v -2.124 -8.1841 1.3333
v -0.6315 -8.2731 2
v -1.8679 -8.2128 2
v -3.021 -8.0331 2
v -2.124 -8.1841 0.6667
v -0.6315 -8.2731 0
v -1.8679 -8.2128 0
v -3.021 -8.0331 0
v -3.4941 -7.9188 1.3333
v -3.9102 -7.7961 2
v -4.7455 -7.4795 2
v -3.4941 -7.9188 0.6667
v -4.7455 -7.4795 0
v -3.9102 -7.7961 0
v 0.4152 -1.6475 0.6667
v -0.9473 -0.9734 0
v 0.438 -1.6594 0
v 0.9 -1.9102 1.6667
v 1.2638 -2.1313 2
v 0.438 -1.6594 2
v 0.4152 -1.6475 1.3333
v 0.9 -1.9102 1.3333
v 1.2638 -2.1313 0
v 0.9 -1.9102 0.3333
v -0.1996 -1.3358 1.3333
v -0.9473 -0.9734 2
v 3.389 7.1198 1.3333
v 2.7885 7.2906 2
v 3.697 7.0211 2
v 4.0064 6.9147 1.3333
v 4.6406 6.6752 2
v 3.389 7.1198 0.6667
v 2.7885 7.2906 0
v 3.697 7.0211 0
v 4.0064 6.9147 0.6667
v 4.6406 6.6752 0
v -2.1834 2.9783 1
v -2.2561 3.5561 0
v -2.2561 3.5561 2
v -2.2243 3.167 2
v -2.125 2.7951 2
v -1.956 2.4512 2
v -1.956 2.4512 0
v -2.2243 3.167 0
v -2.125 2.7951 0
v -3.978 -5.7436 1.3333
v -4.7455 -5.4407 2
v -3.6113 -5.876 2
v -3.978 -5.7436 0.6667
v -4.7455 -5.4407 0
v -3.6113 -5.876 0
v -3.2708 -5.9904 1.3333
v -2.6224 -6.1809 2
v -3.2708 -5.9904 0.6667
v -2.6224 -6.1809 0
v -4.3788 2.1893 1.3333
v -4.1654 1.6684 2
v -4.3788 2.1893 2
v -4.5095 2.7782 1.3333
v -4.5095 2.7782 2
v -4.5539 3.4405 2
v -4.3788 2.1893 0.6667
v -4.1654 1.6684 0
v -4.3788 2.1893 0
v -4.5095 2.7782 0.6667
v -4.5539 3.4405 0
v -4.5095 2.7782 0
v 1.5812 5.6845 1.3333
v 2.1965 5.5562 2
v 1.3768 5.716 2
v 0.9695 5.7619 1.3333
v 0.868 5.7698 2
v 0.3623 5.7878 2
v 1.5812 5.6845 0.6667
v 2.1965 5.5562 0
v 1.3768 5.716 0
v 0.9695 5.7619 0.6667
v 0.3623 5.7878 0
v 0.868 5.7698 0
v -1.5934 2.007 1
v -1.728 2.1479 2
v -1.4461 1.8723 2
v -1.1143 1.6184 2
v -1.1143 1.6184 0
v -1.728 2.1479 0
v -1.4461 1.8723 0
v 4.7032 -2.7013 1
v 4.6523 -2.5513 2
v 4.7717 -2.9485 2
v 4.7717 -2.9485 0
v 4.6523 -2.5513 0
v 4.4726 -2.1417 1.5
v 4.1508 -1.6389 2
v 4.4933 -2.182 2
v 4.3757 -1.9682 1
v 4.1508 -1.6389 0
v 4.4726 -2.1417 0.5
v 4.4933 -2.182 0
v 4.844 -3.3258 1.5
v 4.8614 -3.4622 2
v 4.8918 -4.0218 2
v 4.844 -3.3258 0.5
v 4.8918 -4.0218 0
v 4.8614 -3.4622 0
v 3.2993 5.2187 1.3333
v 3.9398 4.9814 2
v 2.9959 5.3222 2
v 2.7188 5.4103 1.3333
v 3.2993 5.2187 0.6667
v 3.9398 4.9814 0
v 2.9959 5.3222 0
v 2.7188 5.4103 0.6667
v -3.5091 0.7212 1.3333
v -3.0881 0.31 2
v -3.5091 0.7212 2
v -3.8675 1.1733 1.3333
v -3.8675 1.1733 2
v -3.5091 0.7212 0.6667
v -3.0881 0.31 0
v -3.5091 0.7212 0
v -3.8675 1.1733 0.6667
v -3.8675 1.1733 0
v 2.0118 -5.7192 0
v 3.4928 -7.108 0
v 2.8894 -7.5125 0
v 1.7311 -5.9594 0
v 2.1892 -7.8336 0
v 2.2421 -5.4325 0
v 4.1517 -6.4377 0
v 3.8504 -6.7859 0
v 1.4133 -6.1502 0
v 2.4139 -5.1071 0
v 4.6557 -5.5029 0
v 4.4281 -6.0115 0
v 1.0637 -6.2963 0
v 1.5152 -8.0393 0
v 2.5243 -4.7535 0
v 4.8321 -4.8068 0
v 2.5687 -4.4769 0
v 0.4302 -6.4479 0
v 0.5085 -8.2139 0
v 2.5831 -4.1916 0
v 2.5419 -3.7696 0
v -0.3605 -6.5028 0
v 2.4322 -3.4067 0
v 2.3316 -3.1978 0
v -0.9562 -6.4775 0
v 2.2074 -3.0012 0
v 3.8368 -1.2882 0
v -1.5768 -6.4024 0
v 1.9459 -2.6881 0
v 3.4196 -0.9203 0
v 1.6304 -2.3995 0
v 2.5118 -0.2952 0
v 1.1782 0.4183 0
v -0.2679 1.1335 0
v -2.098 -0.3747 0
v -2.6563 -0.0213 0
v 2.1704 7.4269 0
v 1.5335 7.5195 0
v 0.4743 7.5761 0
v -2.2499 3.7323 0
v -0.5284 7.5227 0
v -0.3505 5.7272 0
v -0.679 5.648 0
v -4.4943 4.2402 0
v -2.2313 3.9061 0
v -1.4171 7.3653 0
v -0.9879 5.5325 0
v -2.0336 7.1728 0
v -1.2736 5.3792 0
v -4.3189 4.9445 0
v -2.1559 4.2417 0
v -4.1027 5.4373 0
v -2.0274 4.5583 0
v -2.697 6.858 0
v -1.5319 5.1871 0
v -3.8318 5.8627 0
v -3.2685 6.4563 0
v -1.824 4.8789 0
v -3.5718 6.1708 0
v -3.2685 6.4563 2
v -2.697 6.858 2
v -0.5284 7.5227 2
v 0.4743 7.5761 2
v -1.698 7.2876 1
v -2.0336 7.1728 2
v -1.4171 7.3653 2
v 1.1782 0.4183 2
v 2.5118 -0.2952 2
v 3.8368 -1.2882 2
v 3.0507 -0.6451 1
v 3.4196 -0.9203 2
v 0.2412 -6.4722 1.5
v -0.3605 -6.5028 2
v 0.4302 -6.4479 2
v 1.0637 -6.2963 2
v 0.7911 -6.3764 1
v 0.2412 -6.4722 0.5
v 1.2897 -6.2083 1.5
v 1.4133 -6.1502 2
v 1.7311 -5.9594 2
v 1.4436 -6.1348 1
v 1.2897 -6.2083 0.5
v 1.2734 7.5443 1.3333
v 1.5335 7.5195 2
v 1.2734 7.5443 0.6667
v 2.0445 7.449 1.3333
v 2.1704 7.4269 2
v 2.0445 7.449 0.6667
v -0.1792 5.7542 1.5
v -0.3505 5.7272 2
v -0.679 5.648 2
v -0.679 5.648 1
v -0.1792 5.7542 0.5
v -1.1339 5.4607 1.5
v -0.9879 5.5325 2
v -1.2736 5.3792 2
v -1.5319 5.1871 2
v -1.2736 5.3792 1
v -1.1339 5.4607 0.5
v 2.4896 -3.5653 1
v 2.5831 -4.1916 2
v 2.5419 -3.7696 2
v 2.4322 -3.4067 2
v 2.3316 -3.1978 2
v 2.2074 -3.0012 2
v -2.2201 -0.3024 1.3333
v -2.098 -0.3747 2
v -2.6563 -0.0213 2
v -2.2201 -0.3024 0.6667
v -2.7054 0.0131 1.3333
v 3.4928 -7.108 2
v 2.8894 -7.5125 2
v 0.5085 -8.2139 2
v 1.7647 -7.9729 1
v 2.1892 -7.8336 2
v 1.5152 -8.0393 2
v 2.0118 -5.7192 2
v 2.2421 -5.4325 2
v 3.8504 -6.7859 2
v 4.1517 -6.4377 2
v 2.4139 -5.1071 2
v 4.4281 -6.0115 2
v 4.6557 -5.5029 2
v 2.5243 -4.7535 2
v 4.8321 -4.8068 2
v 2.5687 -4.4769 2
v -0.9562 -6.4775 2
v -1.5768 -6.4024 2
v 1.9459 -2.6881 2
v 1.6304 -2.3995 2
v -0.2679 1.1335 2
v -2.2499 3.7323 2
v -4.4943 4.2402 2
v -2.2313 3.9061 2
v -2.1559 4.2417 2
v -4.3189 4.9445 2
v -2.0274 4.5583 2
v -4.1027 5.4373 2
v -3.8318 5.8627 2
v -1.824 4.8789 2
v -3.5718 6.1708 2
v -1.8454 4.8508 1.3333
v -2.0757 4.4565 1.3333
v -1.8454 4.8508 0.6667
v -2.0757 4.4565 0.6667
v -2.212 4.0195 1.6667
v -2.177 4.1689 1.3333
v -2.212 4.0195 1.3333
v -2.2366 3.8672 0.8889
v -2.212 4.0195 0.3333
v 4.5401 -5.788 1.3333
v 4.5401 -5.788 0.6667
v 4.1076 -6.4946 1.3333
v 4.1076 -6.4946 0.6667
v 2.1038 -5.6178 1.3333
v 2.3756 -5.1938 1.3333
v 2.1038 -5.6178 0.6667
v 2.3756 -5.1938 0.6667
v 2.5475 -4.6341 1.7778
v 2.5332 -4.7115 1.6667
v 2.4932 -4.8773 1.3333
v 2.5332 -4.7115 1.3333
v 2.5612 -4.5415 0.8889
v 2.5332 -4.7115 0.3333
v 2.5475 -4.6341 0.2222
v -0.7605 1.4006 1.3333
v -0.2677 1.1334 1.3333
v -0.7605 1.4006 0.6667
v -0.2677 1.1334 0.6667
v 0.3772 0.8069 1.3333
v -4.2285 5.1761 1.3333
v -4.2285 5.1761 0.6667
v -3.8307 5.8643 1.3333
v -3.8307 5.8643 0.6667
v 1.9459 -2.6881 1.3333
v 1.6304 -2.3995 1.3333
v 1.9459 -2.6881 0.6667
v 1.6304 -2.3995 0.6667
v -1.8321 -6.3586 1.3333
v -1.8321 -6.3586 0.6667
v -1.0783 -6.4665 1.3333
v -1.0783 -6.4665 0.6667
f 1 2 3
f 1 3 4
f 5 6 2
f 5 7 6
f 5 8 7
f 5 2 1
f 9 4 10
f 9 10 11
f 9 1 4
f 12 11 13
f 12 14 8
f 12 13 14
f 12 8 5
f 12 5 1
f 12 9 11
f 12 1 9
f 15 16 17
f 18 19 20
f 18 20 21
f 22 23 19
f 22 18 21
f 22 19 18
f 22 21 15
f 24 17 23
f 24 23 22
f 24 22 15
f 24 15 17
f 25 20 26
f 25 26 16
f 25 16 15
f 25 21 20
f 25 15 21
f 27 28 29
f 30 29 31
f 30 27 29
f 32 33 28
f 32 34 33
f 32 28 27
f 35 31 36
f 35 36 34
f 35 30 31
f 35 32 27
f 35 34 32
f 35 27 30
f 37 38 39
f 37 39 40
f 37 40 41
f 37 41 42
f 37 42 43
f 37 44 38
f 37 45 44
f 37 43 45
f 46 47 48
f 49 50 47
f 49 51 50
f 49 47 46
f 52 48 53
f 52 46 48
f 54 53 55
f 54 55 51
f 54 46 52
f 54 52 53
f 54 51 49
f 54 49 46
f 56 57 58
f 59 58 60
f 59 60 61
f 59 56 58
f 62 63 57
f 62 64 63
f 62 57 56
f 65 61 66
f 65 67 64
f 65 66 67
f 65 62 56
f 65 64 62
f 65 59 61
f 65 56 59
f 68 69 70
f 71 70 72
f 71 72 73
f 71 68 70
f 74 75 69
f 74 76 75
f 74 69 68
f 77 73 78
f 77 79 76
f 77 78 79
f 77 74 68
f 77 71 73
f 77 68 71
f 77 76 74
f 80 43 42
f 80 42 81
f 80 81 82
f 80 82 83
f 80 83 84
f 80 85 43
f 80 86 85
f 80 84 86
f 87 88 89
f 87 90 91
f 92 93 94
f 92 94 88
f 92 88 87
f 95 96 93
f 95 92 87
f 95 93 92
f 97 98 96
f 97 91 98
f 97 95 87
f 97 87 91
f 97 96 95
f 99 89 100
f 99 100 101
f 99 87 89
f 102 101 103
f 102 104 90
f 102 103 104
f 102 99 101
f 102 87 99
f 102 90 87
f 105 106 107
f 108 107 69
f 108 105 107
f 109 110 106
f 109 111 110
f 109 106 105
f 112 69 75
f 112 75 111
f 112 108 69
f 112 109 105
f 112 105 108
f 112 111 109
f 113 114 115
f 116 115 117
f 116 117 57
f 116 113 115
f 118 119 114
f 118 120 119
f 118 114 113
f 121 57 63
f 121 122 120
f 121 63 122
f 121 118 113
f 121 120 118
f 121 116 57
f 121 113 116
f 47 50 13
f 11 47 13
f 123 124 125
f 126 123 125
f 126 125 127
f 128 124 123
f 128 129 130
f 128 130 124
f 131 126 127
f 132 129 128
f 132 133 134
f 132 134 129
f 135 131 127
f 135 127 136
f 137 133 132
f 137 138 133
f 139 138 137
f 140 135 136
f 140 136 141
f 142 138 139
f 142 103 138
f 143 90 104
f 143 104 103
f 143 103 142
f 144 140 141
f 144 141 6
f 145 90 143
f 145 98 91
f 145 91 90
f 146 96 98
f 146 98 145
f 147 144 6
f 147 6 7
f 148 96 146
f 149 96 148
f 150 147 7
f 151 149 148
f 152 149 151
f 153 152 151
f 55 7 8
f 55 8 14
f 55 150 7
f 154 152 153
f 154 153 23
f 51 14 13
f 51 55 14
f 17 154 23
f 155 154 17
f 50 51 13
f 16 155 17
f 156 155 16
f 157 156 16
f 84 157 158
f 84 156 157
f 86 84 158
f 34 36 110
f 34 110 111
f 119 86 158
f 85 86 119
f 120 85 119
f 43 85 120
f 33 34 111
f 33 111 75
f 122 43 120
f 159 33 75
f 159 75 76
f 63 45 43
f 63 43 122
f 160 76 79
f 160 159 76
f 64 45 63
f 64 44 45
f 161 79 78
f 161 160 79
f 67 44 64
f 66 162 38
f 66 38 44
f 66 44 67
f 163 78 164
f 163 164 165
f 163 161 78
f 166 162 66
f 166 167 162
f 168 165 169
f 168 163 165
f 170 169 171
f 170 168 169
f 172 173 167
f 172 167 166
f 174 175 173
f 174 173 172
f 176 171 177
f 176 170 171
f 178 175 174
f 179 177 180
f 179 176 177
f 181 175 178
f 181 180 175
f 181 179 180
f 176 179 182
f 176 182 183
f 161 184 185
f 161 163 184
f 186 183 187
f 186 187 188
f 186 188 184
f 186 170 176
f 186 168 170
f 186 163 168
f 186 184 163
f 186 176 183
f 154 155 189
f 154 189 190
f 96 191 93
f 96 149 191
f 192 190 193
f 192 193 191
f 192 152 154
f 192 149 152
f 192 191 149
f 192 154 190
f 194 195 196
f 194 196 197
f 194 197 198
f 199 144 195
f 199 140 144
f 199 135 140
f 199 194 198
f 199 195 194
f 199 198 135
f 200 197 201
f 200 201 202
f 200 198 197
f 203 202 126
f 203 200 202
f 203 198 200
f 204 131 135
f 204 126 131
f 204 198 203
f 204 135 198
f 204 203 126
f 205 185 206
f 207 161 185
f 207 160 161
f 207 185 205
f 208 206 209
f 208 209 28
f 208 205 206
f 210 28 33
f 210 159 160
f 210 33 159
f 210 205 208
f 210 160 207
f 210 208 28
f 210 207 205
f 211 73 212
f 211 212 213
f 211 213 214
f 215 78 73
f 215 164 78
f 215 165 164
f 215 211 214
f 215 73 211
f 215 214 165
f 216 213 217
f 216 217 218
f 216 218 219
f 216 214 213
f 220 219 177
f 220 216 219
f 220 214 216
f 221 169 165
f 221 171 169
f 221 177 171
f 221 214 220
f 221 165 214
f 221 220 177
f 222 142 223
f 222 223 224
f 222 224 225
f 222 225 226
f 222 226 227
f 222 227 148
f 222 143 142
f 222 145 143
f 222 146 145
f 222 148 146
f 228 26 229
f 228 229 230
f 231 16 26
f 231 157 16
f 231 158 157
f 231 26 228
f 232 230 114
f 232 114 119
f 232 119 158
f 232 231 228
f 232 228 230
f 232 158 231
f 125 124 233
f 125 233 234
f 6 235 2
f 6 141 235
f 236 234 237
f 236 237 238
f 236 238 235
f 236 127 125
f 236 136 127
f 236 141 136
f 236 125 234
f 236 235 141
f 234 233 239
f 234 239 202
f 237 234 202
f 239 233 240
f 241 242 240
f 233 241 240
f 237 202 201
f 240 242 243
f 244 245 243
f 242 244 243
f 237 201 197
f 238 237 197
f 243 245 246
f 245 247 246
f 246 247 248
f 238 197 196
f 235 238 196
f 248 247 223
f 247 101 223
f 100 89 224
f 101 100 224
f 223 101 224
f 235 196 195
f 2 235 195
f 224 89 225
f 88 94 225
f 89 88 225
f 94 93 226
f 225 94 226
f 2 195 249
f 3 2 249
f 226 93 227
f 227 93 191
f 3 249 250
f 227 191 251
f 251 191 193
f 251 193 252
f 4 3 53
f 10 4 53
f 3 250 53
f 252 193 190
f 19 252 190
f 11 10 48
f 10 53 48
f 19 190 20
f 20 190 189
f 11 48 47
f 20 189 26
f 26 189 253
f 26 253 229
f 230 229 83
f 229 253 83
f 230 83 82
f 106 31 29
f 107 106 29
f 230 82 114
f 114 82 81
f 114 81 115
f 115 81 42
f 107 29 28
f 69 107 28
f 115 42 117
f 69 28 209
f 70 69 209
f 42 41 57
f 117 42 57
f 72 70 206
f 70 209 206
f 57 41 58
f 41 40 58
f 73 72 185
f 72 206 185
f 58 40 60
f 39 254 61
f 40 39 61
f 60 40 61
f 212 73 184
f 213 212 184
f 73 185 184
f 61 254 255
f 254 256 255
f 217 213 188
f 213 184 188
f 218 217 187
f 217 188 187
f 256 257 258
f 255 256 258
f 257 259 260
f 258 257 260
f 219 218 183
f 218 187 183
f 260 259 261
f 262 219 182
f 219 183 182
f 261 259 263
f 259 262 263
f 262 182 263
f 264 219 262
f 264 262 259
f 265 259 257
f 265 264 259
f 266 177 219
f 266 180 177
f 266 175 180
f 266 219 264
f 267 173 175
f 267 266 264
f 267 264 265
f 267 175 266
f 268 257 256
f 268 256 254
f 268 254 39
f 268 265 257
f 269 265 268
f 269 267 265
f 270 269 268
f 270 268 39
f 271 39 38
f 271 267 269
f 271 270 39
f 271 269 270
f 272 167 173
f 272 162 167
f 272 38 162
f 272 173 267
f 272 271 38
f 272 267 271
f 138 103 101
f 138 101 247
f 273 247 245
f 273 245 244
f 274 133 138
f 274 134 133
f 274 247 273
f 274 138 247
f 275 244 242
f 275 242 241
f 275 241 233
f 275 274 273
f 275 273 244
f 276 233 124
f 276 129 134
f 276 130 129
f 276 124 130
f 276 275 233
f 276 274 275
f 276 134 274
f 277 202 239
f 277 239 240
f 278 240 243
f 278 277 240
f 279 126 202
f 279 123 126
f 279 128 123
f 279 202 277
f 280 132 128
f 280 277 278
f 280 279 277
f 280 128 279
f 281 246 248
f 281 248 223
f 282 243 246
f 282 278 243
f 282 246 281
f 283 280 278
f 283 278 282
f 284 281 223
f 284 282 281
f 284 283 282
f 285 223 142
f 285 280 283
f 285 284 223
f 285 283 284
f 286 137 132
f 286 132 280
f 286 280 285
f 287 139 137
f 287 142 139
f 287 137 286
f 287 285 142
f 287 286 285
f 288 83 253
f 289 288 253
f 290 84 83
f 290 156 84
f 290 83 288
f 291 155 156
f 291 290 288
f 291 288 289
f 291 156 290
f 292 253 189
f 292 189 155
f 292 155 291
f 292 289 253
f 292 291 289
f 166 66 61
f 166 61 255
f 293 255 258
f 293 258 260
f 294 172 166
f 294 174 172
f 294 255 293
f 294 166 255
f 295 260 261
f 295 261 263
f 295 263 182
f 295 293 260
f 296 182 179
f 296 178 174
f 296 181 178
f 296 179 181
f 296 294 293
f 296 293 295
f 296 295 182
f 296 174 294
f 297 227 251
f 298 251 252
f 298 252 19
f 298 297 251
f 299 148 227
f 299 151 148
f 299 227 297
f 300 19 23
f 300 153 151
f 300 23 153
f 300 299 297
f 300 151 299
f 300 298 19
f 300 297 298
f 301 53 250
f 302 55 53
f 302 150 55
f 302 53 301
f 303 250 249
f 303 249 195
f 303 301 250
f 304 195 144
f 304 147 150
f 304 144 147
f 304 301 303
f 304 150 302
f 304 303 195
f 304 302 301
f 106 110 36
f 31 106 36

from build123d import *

# Parameters (mm, degrees)
F1_DEPTH = 2


# Not quite as in the source:
# - ends of sketch curves that miss each other by under 0.0002 mm in the source are joined
# - the dataset's text gives a spline's control points without its knots; the knots are read off the source's solid


with BuildPart() as f1:
    # F0 (on Top) → F1 (new body)
    with BuildSketch(Plane.XY):
        with BuildLine():
            add(Edge.make_bspline(
                [(-4.5539323159, 3.4404925622), (-4.553932314, 4.109133441), (-4.4417509068, 4.6815041688), (-4.121937897, 5.4234547922), (-3.9898413305, 5.6517314099), (-3.6715155244, 6.0768112467), (-3.4851703783, 6.273694276), (-3.2685167558, 6.4563475141)],
                knots=[0, 0, 0, 0, 0.5, 0.5, 0.75, 0.75, 1, 1, 1, 1], degree=3))
            add(Edge.make_bspline(
                [(-4.1653522884, 1.6684308192), (-4.4188295054, 2.1571348906), (-4.5539323132, 2.7395984093), (-4.5539323159, 3.4404925622)],
                knots=[0, 0, 0, 0, 1, 1, 1, 1], degree=3))
            add(Edge.make_bspline(
                [(-3.0880831784, 0.3100080442), (-3.5410735232, 0.7013744056), (-3.8969951229, 1.1510382057), (-4.1653522884, 1.6684308192)],
                knots=[0, 0, 0, 0, 1, 1, 1, 1], degree=3))
            add(Edge.make_bspline(
                [(-0.94726724, -0.9733503247), (-0.9476283907, -0.9731801173), (-0.9479895414, -0.9730099099), (-0.948350692, -0.9728397025), (-1.4381555261, -0.7419986681), (-1.8627330629, -0.5176434714), (-2.5774559291, -0.0871012519), (-2.8674308006, 0.1193728081), (-3.0880831784, 0.3100080442)],
                knots=[-0.0003686679, -0.0003686679, -0.0003686679, -0.0003686679, 0, 0, 0, 0.5, 0.5, 1, 1, 1, 1], degree=3))
            add(Edge.make_bspline(
                [(1.2638188496, -2.1313058458), (1.0591492674, -1.9955628295), (0.7810896534, -1.8386696922), (0.0493295513, -1.4564253852), (-0.4034193402, -1.2324993239), (-0.9461859739, -0.9738655589), (-0.9465463959, -0.9736938141), (-0.946906818, -0.9735220694), (-0.94726724, -0.9733503247)],
                knots=[0, 0, 0, 0, 0.5, 0.5, 1, 1, 1, 1.000332023, 1.000332023, 1.000332023, 1.000332023], degree=3))
            add(Edge.make_bspline(
                [(2.2073726786, -3.0012041242), (1.9740381312, -2.6745358034), (1.654810322, -2.3906232081), (1.2638188496, -2.1313058458)],
                knots=[0, 0, 0, 0, 1, 1, 1, 1], degree=3))
            add(Edge.make_bspline(
                [(2.5831118874, -4.1916276187), (2.5831119009, -3.9779409831), (2.5527095247, -3.7664931745), (2.4264212856, -3.3640546657), (2.3305505576, -3.173653134), (2.2073726786, -3.0012041242)],
                knots=[0, 0, 0, 0, 0.5, 0.5, 1, 1, 1, 1], degree=3))
            add(Edge.make_bspline(
                [(1.7310564521, -5.9594051259), (1.8694470021, -5.8607866548), (1.9951638757, -5.7464648732), (2.2124688094, -5.4892251058), (2.3038523063, -5.3464167266), (2.519150799, -4.8886706939), (2.5831119027, -4.5468724456), (2.5831118874, -4.1916276187)],
                knots=[0, 0, 0, 0, 0.25, 0.25, 0.5, 0.5, 1, 1, 1, 1], degree=3))
            add(Edge.make_bspline(
                [(-0.3604753147, -6.502818499), (0.0582122658, -6.5028185014), (0.4414416098, -6.4634017893), (1.1407820285, -6.2894614297), (1.4577253675, -6.1541835635), (1.7310564521, -5.9594051259)],
                knots=[0, 0, 0, 0, 0.5, 0.5, 1, 1, 1, 1], degree=3))
            add(Edge.make_bspline(
                [(-2.6224302874, -6.1809013634), (-1.8135993387, -6.3928882585), (-1.0605109021, -6.5028184969), (-0.3604753147, -6.502818499)],
                knots=[0, 0, 0, 0, 1, 1, 1, 1], degree=3))
            add(Edge.make_bspline(
                [(-4.7454580591, -5.4407007971), (-3.9473161615, -5.7716151358), (-3.2419123285, -6.018541014), (-2.6224302874, -6.1809013634)],
                knots=[0.2417760748, 0.2417760748, 0.2417760748, 0.2417760748, 1, 1, 1, 1], degree=3))
            Line((-4.7454580591, -5.4407007971), (-4.7454580591, -7.4795386684))
            add(Edge.make_bspline(
                [(-0.6315023097, -8.2730601286), (-2.1864345754, -8.2730601282), (-3.5521940185, -8.0048830709), (-4.7454580591, -7.4795386684)],
                knots=[0, 0, 0, 0, 0.9183123613, 0.9183123613, 0.9183123613, 0.9183123613], degree=3))
            add(Edge.make_bspline(
                [(3.4928160756, -7.1080140655), (3.0203241877, -7.4861136355), (2.4493404192, -7.7758563937), (1.0800859896, -8.1699938198), (0.2819186052, -8.2730601281), (-0.6315023097, -8.2730601286)],
                knots=[0, 0, 0, 0, 0.5, 0.5, 1, 1, 1, 1], degree=3))
            add(Edge.make_bspline(
                [(4.8917938139, -4.0217840352), (4.8917938118, -4.7009415685), (4.7711067522, -5.2821953174), (4.4246282935, -6.0408703732), (4.2811707681, -6.2753258521), (3.9340237801, -6.7139024983), (3.7301988047, -6.918054596), (3.4928160756, -7.1080140655)],
                knots=[0, 0, 0, 0, 0.5, 0.5, 0.75, 0.75, 1, 1, 1, 1], degree=3))
            add(Edge.make_bspline(
                [(4.1507940458, -1.638882878), (4.396515413, -1.9570273867), (4.5792206673, -2.30751695), (4.827118095, -3.0950479417), (4.8917938123, -3.5328168935), (4.8917938139, -4.0217840352)],
                knots=[0, 0, 0, 0, 0.5, 0.5, 1, 1, 1, 1], degree=3))
            add(Edge.make_bspline(
                [(1.1782471579, 0.4183491959), (1.9294970419, 0.0585462091), (2.5547792836, -0.2982557111), (3.5466215561, -0.992037242), (3.9119064629, -1.3295863067), (4.1507940458, -1.638882878)],
                knots=[0, 0, 0, 0, 0.5, 0.5, 1, 1, 1, 1], degree=3))
            add(Edge.make_bspline(
                [(-1.1143311666, 1.6184455474), (-1.0162509018, 1.5510390918), (-0.9004048855, 1.4804604262), (-0.6206808382, 1.3208013117), (-0.45698794, 1.2321520315), (0.1108160421, 0.9359869549), (0.5914968065, 0.6983949543), (1.1782471579, 0.4183491959)],
                knots=[0, 0, 0, 0, 0.25, 0.25, 0.5, 0.5, 0.9998046197, 0.9998046197, 0.9998046197, 0.9998046197], degree=3))
            add(Edge.make_bspline(
                [(-1.9560474883, 2.451198266), (-1.8566181148, 2.2916099906), (-1.7343676506, 2.1446246375), (-1.4523338231, 1.8693058849), (-1.2924097348, 1.7408315854), (-1.1143311666, 1.6184455474)],
                knots=[0, 0, 0, 0, 0.5, 0.5, 1, 1, 1, 1], degree=3))
            add(Edge.make_bspline(
                [(-2.2560914692, 3.5561307467), (-2.2560914812, 3.358554546), (-2.232979569, 3.1644905564), (-2.1338539681, 2.7921448588), (-2.0575762287, 2.6141561535), (-1.9560474883, 2.451198266)],
                knots=[0, 0, 0, 0, 0.5, 0.5, 1, 1, 1, 1], degree=3))
            add(Edge.make_bspline(
                [(-1.5318803699, 5.1870673998), (-1.6485374043, 5.0854884976), (-1.7539534558, 4.9731201094), (-1.9368474168, 4.7284320339), (-2.0142254381, 4.5961241937), (-2.1985253422, 4.1773747627), (-2.2560914855, 3.8703955411), (-2.2560914692, 3.5561307467)],
                knots=[0, 0, 0, 0, 0.25, 0.25, 0.5, 0.5, 1, 1, 1, 1], degree=3))
            add(Edge.make_bspline(
                [(0.3622633388, 5.7878203751), (-0.012208003, 5.7878203799), (-0.3599577221, 5.7447623809), (-0.9981166165, 5.5511975822), (-1.2885907071, 5.398911453), (-1.5318803699, 5.1870673998)],
                knots=[0, 0, 0, 0, 0.5, 0.5, 1, 1, 1, 1], degree=3))
            add(Edge.make_bspline(
                [(2.1965066912, 5.556154833), (1.5795493196, 5.7097488235), (0.967120358, 5.7878203748), (0.3622633388, 5.7878203751)],
                knots=[0, 0, 0, 0, 1, 1, 1, 1], degree=3))
            add(Edge.make_bspline(
                [(3.9397827582, 4.9814492737), (3.2685520169, 5.2415958191), (2.6904101659, 5.4331955967), (2.1965066912, 5.556154833)],
                knots=[0.1998130955, 0.1998130955, 0.1998130955, 0.1998130955, 1, 1, 1, 1], degree=3))
            Line((3.9397827582, 4.9814492737), (4.6406248453, 6.6751509842))
            add(Edge.make_bspline(
                [(2.7885063884, 7.2906242127), (3.380503744, 7.1369061979), (3.9980767952, 6.9320131673), (4.6406248453, 6.6751509842)],
                knots=[0, 0, 0, 0, 0.7923628244, 0.7923628244, 0.7923628244, 0.7923628244], degree=3))
            add(Edge.make_bspline(
                [(0.4742878301, 7.5761304711), (1.2877472267, 7.5761304708), (2.0577984223, 7.4803598207), (2.7885063884, 7.2906242127)],
                knots=[0, 0, 0, 0, 1, 1, 1, 1], degree=3))
            add(Edge.make_bspline(
                [(-3.2685167558, 6.4563475141), (-2.836280375, 6.8207511786), (-2.3183058122, 7.0983331165), (-1.0776039847, 7.4767690155), (-0.3546345611, 7.5761304704), (0.4742878301, 7.5761304711)],
                knots=[0, 0, 0, 0, 0.5, 0.5, 1, 1, 1, 1], degree=3))
        make_face()
    extrude(amount=F1_DEPTH)


solid = f1.part
